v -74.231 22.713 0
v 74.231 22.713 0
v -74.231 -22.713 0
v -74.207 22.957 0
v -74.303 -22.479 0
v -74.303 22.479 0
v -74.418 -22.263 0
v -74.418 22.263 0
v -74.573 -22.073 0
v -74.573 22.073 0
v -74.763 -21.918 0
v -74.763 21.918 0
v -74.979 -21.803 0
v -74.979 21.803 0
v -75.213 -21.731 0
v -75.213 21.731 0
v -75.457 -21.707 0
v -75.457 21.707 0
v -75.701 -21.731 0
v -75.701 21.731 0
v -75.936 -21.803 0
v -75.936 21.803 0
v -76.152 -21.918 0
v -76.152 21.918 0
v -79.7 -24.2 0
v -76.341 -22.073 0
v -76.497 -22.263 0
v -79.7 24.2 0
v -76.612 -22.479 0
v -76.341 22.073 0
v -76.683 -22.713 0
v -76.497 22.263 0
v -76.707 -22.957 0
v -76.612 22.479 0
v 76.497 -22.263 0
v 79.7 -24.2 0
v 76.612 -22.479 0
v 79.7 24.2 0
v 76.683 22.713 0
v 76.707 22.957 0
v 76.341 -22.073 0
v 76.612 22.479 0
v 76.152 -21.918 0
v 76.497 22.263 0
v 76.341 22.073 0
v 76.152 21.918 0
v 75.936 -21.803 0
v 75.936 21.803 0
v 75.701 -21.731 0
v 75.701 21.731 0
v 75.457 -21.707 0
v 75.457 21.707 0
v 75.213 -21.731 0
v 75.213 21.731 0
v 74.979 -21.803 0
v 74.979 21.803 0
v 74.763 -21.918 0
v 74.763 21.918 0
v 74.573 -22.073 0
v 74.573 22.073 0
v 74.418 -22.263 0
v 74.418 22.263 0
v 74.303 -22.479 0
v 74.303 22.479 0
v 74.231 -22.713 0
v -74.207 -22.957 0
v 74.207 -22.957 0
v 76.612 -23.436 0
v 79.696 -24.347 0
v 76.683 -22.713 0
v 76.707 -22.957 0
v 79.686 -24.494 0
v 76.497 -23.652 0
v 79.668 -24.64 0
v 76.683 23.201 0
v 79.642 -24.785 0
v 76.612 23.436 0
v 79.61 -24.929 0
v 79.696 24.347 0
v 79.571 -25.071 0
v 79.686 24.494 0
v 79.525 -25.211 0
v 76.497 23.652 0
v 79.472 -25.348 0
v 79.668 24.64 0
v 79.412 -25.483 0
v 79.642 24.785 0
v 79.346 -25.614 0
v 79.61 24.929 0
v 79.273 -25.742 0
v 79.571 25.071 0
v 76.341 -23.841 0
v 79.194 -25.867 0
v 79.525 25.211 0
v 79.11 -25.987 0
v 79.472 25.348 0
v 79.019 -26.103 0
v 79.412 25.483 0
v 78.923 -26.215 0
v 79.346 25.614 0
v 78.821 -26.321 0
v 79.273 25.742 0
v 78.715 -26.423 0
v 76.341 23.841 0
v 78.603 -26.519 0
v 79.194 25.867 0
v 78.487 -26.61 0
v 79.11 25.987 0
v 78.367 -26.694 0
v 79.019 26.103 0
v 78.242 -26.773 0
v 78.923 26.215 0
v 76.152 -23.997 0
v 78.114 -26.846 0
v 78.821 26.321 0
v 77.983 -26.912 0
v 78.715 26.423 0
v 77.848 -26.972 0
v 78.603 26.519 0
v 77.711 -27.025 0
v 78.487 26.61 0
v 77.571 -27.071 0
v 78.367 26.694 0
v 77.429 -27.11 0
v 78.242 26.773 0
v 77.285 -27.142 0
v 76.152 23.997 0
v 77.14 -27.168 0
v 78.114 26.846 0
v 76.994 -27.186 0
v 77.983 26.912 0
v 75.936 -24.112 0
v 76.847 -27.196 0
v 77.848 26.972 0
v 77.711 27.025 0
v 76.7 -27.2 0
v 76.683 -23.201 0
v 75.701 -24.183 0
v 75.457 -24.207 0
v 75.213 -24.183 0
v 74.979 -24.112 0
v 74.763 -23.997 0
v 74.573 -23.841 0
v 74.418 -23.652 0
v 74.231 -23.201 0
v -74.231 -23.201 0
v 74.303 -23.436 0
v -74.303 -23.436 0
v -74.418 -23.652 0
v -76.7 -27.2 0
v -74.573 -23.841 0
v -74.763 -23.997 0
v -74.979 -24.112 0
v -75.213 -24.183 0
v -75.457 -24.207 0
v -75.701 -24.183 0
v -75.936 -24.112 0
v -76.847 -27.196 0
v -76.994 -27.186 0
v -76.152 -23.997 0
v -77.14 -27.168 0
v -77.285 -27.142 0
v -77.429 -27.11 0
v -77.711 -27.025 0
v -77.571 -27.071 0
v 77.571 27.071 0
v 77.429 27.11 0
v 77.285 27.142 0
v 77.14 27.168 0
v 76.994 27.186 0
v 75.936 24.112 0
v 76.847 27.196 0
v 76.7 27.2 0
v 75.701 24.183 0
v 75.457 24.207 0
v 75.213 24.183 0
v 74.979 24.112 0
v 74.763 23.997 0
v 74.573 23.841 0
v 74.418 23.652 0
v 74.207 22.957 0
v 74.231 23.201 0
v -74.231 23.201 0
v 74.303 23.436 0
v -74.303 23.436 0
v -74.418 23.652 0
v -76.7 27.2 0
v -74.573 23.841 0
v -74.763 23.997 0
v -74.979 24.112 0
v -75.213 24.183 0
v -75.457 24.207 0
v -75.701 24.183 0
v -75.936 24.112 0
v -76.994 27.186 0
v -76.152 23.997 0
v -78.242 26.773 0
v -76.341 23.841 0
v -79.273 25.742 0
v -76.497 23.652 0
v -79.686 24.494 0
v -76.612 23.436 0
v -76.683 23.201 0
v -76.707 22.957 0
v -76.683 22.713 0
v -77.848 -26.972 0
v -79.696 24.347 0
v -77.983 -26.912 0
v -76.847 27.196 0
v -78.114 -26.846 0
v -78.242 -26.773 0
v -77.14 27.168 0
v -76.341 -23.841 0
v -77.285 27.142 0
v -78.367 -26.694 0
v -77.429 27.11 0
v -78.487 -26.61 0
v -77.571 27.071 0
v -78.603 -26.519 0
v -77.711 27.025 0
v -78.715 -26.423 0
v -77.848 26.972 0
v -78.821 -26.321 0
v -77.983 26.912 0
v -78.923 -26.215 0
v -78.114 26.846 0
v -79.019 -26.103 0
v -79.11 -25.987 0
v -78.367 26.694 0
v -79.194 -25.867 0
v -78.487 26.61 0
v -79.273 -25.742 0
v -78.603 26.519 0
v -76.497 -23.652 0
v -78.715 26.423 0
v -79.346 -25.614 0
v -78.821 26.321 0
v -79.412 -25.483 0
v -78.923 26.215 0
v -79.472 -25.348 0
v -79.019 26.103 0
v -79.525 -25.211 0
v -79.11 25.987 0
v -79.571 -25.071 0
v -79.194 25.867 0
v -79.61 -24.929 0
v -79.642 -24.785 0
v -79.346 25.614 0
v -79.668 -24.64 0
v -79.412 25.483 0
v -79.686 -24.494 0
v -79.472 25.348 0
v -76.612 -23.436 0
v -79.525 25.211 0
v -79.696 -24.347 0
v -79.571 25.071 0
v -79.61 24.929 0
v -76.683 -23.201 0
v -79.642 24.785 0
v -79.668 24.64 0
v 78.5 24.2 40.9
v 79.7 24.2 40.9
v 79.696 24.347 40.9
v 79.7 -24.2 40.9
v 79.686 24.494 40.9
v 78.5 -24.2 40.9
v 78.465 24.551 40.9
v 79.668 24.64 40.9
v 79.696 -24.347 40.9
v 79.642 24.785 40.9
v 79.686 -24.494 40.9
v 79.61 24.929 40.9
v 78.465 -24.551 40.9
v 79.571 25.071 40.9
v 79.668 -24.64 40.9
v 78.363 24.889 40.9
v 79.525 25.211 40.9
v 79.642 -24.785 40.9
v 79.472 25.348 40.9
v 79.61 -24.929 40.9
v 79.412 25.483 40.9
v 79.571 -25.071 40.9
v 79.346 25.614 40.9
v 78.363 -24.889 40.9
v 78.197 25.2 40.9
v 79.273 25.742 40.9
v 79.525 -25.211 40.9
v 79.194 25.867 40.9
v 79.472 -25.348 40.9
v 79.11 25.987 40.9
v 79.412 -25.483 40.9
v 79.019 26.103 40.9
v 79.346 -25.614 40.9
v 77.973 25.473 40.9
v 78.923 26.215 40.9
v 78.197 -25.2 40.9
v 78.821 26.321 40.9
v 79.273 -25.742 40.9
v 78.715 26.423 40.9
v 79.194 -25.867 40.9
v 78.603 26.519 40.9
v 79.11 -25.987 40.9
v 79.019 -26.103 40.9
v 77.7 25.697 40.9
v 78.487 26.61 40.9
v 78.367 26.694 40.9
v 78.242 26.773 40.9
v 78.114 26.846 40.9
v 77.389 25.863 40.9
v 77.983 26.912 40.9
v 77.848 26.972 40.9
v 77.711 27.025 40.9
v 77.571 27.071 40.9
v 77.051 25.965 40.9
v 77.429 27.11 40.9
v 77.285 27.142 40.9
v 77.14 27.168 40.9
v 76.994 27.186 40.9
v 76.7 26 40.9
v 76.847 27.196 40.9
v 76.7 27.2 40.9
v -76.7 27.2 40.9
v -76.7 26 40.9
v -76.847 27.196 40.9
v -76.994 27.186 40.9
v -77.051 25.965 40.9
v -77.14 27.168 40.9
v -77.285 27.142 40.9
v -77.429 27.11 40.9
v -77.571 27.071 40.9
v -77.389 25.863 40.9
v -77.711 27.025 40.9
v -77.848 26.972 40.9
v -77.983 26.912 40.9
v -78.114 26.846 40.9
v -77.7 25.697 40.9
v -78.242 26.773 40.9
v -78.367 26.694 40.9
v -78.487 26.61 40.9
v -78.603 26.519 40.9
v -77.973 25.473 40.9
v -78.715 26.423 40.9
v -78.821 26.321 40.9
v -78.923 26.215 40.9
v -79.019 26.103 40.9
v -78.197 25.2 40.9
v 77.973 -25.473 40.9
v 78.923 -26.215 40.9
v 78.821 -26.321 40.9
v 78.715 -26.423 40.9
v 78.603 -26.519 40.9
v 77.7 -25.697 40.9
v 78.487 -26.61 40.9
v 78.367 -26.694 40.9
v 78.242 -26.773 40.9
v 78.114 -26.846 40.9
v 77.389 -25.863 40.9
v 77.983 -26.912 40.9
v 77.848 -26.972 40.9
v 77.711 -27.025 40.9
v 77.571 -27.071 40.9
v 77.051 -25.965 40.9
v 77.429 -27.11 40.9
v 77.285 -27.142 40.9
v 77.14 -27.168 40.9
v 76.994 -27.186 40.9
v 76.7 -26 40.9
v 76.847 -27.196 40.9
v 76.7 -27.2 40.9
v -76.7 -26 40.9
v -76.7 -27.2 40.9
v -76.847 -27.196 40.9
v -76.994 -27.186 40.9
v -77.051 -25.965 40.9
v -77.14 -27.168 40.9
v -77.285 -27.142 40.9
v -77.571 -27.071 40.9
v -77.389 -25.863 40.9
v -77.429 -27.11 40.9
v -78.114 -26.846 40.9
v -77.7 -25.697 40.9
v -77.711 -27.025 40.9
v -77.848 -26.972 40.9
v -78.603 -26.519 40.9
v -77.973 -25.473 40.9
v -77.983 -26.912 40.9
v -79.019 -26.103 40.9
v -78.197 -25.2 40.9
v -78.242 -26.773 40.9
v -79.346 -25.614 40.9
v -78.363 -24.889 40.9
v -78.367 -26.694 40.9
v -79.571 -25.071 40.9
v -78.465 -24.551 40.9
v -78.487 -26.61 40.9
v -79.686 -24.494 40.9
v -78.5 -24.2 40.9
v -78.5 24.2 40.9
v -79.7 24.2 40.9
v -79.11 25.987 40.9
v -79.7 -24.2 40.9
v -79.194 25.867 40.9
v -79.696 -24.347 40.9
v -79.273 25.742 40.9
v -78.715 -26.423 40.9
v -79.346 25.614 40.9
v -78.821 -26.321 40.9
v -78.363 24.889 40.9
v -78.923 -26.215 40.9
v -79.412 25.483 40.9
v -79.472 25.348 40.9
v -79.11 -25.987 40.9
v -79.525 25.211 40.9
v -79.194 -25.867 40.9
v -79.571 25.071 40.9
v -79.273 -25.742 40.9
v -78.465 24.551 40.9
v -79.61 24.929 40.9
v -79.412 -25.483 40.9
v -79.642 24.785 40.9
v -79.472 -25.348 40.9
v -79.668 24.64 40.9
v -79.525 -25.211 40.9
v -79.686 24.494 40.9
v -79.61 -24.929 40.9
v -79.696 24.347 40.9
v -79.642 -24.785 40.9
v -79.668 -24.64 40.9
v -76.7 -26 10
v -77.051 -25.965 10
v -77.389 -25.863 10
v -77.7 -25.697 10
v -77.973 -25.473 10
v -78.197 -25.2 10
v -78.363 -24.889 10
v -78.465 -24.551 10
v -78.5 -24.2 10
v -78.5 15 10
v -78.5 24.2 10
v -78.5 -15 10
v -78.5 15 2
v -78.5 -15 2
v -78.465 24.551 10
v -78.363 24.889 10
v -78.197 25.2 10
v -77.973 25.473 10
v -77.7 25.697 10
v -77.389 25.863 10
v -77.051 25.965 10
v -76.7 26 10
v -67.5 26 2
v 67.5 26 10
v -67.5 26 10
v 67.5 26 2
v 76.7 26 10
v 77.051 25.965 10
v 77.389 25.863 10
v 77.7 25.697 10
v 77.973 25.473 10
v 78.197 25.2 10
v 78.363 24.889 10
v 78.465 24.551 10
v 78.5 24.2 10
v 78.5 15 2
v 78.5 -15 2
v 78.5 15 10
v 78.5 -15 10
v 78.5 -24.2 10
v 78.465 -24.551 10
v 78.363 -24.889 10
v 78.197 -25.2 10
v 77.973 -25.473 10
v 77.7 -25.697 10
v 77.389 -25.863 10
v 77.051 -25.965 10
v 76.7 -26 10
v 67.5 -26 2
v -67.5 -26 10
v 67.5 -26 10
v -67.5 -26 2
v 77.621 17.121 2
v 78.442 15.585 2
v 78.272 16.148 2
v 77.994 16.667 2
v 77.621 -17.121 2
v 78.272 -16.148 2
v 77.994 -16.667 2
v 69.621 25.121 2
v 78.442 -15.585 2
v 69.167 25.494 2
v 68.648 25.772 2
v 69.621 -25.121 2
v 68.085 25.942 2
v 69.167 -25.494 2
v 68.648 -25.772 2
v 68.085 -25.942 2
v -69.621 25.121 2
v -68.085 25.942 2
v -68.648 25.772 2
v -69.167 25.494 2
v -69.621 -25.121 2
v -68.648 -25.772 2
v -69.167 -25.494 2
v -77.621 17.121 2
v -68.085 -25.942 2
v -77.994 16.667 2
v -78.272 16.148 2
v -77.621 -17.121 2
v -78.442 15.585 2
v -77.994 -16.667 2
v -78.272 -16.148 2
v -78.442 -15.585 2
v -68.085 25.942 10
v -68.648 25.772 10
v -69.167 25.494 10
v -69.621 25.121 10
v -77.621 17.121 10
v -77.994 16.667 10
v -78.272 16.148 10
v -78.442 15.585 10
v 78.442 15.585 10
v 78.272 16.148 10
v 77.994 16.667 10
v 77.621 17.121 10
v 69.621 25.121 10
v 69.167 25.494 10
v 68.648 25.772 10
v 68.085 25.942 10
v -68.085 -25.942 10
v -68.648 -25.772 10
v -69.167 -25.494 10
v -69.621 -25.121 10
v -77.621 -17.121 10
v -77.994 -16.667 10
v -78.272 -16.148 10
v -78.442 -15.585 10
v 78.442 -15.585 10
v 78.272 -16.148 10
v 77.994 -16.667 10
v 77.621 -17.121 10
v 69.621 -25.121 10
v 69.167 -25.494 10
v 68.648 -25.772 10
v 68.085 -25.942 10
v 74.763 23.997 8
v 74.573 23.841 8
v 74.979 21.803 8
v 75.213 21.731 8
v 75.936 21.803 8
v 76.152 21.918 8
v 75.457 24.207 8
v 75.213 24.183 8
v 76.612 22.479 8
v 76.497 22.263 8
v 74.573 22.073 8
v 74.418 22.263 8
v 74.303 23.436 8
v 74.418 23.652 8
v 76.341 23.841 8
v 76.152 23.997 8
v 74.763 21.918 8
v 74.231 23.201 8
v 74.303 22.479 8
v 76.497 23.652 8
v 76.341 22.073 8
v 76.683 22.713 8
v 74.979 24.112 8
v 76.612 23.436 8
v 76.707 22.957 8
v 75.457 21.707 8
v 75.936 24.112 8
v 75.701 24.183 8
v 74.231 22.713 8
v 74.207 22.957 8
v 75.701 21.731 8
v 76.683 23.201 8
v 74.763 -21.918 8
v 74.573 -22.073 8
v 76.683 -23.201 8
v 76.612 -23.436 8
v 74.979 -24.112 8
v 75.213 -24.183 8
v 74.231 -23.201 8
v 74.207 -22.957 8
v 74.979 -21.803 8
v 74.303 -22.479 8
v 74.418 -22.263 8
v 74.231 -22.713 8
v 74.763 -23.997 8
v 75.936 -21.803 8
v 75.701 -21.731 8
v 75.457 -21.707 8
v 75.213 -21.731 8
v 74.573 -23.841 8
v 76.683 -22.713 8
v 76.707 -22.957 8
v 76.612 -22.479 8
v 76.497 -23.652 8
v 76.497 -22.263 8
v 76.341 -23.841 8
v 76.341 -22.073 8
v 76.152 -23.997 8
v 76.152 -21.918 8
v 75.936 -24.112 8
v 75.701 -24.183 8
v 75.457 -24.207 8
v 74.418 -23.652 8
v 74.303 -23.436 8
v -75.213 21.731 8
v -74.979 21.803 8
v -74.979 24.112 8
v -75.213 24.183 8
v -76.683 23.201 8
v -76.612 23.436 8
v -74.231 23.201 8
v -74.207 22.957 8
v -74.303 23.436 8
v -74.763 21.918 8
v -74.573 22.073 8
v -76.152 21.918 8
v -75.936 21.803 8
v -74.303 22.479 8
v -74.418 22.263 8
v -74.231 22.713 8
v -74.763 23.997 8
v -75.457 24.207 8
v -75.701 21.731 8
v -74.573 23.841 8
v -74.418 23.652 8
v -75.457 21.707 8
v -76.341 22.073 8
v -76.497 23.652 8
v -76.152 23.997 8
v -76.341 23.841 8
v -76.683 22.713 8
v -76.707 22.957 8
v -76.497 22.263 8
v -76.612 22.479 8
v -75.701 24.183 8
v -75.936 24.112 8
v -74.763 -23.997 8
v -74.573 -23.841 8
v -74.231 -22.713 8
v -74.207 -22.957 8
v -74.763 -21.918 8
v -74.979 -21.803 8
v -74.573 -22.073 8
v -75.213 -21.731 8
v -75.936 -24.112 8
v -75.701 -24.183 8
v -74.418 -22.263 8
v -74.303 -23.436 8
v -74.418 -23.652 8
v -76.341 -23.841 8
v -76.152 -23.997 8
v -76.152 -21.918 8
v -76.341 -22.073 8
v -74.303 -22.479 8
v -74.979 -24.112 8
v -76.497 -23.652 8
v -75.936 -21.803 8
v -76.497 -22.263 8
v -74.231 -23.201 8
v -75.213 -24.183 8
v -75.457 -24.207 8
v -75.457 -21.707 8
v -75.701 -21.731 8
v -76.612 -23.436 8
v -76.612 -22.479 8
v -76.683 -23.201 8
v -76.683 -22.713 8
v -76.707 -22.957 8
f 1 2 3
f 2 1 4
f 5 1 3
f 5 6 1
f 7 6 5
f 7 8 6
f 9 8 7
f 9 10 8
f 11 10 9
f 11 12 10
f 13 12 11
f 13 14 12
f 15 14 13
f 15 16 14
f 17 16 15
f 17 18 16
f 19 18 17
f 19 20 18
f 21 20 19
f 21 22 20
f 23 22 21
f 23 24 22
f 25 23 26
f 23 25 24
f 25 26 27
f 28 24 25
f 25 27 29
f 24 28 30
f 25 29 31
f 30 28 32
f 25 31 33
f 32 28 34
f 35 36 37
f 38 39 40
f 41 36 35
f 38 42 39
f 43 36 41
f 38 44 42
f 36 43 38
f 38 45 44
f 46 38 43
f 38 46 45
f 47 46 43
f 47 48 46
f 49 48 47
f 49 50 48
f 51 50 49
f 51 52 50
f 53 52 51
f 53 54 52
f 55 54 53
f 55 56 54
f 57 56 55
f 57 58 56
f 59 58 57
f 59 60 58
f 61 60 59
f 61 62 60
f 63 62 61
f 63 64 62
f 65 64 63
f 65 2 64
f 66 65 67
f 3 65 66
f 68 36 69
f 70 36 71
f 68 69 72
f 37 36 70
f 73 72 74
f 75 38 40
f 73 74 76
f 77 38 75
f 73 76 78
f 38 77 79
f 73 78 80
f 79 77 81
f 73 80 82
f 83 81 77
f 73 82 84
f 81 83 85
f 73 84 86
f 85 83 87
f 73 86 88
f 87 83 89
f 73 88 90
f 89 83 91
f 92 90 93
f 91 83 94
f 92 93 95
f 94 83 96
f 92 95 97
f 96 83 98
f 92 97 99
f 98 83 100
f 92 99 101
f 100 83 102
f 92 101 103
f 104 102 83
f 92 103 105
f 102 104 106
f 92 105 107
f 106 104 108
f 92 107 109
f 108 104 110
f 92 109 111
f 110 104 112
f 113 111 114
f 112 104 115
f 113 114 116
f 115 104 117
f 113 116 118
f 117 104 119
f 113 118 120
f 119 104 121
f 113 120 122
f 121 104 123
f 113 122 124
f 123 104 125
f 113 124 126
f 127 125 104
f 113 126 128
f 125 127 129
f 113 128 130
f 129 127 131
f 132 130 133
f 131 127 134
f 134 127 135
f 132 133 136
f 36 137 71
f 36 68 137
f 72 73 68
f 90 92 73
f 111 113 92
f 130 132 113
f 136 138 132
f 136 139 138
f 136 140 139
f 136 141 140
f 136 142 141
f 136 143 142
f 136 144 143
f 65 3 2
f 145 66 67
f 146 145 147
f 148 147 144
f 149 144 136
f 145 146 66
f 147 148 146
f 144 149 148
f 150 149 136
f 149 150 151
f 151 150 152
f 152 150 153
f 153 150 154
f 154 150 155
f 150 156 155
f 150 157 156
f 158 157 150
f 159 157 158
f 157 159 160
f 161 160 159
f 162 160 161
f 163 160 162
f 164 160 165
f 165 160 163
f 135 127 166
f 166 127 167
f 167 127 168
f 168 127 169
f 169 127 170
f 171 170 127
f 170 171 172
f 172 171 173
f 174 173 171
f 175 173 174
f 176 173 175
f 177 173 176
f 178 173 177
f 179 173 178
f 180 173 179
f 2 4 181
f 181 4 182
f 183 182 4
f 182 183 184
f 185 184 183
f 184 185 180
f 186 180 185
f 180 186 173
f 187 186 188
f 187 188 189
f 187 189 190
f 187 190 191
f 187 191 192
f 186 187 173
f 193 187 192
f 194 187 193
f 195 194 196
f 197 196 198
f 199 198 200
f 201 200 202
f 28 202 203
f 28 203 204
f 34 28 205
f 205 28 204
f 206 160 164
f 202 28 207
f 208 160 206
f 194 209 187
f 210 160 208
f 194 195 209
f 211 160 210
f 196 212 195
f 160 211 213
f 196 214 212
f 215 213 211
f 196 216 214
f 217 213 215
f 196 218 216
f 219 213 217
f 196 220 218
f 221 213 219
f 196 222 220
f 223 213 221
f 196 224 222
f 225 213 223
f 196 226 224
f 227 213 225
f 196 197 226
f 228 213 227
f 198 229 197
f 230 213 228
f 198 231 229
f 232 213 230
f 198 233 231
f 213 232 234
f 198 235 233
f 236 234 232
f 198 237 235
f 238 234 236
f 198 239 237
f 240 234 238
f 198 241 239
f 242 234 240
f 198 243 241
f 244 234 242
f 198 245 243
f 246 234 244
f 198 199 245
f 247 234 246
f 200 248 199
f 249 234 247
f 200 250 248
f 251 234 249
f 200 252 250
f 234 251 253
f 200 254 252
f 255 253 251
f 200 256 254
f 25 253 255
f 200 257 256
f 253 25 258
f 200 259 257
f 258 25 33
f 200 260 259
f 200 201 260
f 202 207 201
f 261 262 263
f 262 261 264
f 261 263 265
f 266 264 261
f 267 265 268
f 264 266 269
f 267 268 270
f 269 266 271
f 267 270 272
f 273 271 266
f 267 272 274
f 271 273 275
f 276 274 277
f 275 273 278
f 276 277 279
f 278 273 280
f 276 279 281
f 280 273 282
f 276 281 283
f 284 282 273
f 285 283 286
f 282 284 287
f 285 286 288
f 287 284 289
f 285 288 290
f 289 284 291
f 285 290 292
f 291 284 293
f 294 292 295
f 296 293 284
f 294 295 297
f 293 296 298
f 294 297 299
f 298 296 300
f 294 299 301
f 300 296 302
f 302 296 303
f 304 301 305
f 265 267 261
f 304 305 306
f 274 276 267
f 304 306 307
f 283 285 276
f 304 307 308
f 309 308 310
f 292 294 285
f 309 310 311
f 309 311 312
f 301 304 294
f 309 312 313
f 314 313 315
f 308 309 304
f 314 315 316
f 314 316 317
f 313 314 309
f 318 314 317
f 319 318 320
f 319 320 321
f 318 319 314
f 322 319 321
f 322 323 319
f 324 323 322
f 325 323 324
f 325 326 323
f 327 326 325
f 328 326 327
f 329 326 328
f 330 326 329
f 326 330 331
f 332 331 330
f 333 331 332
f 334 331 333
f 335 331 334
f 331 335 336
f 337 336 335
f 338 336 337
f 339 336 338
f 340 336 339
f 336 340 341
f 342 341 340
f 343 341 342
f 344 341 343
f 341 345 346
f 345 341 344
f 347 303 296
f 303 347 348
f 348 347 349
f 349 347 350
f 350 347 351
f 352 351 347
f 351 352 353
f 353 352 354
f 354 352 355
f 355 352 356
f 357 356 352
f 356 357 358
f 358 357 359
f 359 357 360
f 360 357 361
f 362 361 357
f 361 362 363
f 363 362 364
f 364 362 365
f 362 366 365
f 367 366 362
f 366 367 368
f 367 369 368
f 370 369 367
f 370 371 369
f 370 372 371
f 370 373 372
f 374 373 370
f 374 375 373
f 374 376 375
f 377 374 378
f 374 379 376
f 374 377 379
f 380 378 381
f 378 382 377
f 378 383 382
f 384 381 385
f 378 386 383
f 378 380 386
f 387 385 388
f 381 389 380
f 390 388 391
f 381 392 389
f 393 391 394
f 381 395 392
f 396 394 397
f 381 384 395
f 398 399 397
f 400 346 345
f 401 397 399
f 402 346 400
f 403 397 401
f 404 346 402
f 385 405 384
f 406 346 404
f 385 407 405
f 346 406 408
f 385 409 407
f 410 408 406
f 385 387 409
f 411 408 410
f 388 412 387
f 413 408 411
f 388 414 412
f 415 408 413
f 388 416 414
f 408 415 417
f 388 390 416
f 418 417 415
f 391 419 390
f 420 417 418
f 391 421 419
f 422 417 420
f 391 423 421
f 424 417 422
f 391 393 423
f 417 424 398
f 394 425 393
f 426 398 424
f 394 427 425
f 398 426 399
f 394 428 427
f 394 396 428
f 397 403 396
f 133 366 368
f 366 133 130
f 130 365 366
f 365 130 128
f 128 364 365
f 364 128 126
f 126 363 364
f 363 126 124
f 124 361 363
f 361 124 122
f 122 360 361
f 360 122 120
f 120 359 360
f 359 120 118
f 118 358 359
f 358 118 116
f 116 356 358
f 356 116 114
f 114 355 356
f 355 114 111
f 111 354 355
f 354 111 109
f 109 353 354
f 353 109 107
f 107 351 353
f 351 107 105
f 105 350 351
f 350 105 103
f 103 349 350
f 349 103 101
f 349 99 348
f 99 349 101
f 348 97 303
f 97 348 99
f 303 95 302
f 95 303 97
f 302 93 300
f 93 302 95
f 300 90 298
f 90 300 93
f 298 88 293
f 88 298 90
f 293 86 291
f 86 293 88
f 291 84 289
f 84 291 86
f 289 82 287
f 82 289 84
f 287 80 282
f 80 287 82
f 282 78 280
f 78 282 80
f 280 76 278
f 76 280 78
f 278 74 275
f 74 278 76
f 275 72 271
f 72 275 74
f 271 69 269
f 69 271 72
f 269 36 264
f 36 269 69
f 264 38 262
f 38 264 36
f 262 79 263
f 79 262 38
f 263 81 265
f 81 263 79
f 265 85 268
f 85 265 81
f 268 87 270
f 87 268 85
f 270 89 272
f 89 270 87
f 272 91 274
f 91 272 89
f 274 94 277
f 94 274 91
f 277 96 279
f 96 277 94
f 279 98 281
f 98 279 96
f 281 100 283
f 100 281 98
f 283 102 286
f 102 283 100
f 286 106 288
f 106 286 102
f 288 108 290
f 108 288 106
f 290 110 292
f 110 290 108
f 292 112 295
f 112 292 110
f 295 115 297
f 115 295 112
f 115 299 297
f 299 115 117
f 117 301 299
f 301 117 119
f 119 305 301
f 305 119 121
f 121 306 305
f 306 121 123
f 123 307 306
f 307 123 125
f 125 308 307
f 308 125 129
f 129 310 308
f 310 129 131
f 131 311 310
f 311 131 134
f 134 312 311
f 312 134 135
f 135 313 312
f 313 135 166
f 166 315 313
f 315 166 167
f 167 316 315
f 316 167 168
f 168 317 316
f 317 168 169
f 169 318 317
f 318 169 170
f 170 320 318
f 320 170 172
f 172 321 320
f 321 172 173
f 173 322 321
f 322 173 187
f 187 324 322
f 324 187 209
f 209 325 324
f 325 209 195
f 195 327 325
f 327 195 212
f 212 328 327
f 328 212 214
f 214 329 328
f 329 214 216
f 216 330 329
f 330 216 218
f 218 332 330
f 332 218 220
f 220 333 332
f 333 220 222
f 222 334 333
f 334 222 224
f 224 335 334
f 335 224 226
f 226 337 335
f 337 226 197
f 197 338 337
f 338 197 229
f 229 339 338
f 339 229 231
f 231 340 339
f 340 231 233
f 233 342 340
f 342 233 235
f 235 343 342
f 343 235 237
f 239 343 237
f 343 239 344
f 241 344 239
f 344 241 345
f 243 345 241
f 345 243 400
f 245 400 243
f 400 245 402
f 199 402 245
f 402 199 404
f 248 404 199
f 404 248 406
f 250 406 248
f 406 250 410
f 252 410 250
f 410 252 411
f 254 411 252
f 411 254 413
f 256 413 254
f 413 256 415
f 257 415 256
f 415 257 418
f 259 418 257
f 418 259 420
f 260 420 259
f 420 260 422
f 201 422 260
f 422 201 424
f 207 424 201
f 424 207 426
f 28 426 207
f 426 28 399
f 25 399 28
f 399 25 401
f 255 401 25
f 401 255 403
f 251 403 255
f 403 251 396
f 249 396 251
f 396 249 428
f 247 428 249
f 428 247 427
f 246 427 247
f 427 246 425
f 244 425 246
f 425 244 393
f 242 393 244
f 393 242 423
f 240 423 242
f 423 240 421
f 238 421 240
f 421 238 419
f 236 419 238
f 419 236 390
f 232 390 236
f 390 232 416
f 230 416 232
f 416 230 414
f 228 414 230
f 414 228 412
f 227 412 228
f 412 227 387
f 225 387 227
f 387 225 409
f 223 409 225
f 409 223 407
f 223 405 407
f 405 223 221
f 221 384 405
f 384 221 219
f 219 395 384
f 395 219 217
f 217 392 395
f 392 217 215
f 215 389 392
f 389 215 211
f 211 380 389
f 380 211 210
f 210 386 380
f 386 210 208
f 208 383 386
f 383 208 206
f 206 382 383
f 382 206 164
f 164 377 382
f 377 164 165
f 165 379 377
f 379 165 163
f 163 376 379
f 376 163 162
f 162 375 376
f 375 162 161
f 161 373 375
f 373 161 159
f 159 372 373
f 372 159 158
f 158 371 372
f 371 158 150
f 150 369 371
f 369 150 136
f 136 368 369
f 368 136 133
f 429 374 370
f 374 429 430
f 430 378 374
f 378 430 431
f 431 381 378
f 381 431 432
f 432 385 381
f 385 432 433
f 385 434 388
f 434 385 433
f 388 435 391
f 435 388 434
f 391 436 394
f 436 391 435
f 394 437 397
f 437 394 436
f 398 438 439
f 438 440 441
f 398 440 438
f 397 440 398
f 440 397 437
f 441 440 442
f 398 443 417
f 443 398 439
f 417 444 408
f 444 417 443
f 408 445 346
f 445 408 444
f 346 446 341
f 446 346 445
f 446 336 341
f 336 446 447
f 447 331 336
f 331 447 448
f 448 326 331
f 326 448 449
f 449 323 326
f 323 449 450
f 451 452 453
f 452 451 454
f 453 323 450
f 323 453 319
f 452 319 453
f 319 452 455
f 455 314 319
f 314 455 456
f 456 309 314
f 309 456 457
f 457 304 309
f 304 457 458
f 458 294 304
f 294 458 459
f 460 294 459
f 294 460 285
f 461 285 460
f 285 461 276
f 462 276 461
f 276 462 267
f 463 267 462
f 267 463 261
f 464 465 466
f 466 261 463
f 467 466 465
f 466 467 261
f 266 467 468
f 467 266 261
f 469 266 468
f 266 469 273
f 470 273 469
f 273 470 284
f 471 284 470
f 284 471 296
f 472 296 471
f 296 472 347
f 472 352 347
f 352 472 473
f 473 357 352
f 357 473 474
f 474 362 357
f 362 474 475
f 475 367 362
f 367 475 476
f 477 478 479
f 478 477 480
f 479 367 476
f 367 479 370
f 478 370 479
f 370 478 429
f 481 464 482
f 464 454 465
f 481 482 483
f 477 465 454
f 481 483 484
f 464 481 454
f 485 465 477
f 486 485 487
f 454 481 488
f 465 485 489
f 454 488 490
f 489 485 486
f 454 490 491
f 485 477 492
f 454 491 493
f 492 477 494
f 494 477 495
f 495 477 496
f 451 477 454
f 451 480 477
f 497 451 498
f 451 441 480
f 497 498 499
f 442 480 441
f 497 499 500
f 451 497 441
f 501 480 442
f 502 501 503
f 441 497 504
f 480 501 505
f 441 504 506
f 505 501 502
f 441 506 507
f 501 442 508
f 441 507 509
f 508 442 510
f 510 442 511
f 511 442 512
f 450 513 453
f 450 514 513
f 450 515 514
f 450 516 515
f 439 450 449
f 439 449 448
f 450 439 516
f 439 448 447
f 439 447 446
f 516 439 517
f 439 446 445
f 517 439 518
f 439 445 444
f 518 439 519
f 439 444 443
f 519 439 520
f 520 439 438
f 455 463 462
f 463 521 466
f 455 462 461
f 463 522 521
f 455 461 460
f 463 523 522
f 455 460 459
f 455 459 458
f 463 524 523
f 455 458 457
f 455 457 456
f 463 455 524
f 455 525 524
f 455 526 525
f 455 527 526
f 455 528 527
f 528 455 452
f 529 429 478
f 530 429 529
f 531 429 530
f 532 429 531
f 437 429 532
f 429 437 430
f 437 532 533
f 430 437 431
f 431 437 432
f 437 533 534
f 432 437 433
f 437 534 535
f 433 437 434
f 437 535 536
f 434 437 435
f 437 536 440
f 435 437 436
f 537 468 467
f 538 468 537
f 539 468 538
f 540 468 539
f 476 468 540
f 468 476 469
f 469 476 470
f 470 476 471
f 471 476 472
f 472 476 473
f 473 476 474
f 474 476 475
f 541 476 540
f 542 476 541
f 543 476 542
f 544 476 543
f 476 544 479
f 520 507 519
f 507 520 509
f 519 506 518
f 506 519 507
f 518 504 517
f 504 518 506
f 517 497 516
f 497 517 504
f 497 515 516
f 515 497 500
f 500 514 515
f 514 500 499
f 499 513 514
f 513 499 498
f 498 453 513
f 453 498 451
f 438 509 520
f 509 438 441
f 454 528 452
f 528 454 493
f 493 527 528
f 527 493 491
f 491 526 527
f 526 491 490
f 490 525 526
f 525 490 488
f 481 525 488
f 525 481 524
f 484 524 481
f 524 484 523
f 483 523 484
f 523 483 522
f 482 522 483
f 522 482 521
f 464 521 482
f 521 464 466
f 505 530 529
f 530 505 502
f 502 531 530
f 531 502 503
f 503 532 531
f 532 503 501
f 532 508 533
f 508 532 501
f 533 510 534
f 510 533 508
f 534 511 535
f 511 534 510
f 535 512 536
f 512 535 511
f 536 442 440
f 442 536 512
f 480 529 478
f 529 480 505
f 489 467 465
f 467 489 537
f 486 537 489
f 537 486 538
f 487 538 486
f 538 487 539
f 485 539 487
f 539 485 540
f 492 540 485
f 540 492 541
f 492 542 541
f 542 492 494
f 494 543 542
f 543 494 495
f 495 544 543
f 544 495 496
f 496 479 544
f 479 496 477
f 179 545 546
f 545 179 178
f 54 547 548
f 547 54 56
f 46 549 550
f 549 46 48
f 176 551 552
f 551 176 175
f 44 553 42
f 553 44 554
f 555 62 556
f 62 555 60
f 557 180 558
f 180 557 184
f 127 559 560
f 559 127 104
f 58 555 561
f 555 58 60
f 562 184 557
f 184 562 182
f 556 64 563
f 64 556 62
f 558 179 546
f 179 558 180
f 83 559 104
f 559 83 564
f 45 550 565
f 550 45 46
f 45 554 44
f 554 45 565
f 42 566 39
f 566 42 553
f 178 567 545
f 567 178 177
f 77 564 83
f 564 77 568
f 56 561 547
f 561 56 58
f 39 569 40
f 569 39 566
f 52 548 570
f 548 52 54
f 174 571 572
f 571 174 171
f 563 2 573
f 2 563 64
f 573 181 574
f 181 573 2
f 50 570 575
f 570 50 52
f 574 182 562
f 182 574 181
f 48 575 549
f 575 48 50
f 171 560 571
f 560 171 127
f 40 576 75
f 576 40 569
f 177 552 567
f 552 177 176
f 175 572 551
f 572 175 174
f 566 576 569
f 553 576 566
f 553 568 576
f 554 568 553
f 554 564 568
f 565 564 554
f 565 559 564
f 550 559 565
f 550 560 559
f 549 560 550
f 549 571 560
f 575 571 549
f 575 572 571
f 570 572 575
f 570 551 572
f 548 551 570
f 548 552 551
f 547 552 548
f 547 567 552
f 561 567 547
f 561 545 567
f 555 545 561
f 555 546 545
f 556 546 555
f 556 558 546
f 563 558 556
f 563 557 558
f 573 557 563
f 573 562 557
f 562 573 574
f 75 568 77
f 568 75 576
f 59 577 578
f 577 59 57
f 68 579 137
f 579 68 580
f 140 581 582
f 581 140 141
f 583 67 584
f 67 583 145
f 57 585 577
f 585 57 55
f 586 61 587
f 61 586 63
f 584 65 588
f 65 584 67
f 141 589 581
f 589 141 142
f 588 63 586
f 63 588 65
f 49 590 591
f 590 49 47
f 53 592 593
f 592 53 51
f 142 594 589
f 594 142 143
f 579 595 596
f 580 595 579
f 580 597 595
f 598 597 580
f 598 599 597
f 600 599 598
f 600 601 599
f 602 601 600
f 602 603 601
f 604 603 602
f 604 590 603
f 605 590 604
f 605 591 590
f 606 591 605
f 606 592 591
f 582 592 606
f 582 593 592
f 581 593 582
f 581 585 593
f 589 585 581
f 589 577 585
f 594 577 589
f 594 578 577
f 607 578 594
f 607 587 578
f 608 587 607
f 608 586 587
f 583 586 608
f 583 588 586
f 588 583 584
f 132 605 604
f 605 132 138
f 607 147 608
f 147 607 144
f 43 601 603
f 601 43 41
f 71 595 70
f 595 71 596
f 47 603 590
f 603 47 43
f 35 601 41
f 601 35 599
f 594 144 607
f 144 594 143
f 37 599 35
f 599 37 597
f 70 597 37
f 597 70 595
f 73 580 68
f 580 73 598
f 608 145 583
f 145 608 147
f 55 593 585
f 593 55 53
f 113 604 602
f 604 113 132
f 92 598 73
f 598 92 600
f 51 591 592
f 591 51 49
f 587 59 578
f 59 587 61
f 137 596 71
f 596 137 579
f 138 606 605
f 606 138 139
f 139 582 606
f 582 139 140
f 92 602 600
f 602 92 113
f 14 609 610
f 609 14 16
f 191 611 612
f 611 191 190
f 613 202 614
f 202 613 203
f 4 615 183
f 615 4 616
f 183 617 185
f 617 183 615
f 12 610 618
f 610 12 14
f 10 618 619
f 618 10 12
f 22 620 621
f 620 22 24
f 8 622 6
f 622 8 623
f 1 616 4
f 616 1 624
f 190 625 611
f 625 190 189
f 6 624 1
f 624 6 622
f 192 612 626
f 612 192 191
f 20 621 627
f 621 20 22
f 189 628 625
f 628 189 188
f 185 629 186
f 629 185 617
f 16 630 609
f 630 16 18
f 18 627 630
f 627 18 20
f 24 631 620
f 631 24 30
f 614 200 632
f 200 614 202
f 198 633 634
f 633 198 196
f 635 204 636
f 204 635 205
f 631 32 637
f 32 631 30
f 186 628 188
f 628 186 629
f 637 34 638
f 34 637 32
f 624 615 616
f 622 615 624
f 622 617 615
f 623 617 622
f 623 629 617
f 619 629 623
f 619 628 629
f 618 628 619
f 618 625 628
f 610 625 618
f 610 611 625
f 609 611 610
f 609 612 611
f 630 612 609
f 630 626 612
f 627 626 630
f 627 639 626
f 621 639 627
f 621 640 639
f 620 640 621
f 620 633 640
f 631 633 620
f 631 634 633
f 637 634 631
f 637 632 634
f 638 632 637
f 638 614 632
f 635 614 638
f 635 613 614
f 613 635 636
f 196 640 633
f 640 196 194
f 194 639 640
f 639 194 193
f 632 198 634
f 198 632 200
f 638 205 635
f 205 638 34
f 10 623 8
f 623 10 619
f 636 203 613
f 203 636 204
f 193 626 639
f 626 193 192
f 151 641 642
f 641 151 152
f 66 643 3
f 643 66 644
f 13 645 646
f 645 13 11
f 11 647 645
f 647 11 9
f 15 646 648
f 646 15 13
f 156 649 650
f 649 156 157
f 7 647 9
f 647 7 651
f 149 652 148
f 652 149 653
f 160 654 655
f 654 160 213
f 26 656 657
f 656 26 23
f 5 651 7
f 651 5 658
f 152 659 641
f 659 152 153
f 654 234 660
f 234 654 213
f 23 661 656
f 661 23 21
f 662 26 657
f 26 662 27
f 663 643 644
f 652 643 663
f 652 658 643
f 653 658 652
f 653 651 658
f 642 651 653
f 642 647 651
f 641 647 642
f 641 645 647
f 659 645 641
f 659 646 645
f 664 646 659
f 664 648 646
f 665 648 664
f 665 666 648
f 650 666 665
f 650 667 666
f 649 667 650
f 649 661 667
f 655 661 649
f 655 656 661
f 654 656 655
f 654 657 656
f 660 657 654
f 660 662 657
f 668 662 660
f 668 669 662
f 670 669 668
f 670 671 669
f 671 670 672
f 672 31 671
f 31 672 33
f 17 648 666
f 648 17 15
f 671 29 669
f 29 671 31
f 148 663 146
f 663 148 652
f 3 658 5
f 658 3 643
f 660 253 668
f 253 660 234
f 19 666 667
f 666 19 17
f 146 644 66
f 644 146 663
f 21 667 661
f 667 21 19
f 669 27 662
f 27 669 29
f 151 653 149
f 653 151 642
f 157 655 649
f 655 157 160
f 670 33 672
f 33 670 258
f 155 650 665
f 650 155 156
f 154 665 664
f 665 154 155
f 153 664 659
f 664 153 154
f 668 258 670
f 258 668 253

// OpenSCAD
/* Note that the factory bins have draft which make them injection moldable; we
 * don't need that. */

/* The little circles that the legs fit into to keep the bins from moving around */
gLegCircleSize = 18;

/* Most of the bins have X in this orientation. */
gGridX = 40;
gGridY = 55;

/* So the bins don't fit *too* tightly together */
gTopSlop = 0.6;
// TODO This appears to have rounding issues with s3d; add 0.01 for it
gExtWidth = 0.4;
gWall = gExtWidth*3;

// TODO test print for HF, Stanley sizes
//gHeight=47.8; // for HF
gHeight=40.9; // for Stanley

gPegHole = 2.5;
gPegHead = 6;
gPegCircle = 18; // measure hole in base, and subtract 1mm for intentional slop
gPegDepth = 8;

module RoundRect(w,h,r=1) {
    hull()
    for(x_scale=[1,-1]) for(y_scale=[1,-1])
    scale([x_scale,y_scale])
    translate([w/2-r,h/2-r]) circle(r=r);
}
module Corner(r,e=1) {
    translate([-r,-r]) difference() {
        square([r+e,r+e]);
        circle(r=r,$fn=128);
    }
}
module Ess(w,h,r) {
    difference() {
        square([w,h]);
        // cut corner
        translate([w,h]) Corner(r);
    }
    // add corners
    translate([w,0]) rotate([0,0,180]) Corner(r,0);
    translate([0,h]) rotate([0,0,180]) Corner(r,0);
}

module Fillet(a, r) {
    intersection() {
        difference() {
            hull() {
                translate([-a,a]) circle(r=a);
                translate([a,-a]) circle(r=a);
            }
            hull() {
                translate([a,r]) circle(r=r);
                translate([r,a]) circle(r=r);
            }
        }
        square([a,a]);
    }
}

module Bin(x=1,y=1,wall=gWall,feet=true,cutaway=false) {
    inside_wall_w = (x*gGridX)-(wall*2)-gTopSlop;
    inside_wall_h = (y*gGridY)-(wall*2)-gTopSlop;
    difference() {
        union() {
            linear_extrude(height=gHeight,convexity=4) difference() {
                RoundRect(x*gGridX-gTopSlop,y*gGridY-gTopSlop,3,$fn=128);
                RoundRect(inside_wall_w,inside_wall_h,3-wall,$fn=32);
            }
            // Floor
            linear_extrude(height=2)
            RoundRect(x*gGridX-gTopSlop,y*gGridY-gTopSlop,3,$fn=32);
            if(feet) {
                linear_extrude(height=gPegDepth+2,convexity=4)
                for(x_scale=[1,-1]) for(y_scale=[1,-1])
                    scale([x_scale,y_scale])
                    translate([-inside_wall_w/2,-inside_wall_h/2]) Fillet(11, 3, $fn=32);
                //Ess(6,6,3);
            }
        }
        if(feet) {
            for(x_scale=[1,-1]) for(y_scale=[1,-1])
                scale([x_scale,y_scale])
                translate([(x*gGridX-gTopSlop)/2,(y*gGridY-gTopSlop)/2,-1])
                rotate([0,0,180+45]) translate([(gPegCircle-gPegHead)/2,0])
                cylinder(d=gPegHole,h=gPegDepth+1,$fn=32);
        }
        if(cutaway) {
            translate([-inside_wall_w/2,-inside_wall_h/2,-1])
            rotate([0,0,-45]) translate([0,-1,0]) cube([12,12,20]);
        }
    }
}

Bin(4,1);
